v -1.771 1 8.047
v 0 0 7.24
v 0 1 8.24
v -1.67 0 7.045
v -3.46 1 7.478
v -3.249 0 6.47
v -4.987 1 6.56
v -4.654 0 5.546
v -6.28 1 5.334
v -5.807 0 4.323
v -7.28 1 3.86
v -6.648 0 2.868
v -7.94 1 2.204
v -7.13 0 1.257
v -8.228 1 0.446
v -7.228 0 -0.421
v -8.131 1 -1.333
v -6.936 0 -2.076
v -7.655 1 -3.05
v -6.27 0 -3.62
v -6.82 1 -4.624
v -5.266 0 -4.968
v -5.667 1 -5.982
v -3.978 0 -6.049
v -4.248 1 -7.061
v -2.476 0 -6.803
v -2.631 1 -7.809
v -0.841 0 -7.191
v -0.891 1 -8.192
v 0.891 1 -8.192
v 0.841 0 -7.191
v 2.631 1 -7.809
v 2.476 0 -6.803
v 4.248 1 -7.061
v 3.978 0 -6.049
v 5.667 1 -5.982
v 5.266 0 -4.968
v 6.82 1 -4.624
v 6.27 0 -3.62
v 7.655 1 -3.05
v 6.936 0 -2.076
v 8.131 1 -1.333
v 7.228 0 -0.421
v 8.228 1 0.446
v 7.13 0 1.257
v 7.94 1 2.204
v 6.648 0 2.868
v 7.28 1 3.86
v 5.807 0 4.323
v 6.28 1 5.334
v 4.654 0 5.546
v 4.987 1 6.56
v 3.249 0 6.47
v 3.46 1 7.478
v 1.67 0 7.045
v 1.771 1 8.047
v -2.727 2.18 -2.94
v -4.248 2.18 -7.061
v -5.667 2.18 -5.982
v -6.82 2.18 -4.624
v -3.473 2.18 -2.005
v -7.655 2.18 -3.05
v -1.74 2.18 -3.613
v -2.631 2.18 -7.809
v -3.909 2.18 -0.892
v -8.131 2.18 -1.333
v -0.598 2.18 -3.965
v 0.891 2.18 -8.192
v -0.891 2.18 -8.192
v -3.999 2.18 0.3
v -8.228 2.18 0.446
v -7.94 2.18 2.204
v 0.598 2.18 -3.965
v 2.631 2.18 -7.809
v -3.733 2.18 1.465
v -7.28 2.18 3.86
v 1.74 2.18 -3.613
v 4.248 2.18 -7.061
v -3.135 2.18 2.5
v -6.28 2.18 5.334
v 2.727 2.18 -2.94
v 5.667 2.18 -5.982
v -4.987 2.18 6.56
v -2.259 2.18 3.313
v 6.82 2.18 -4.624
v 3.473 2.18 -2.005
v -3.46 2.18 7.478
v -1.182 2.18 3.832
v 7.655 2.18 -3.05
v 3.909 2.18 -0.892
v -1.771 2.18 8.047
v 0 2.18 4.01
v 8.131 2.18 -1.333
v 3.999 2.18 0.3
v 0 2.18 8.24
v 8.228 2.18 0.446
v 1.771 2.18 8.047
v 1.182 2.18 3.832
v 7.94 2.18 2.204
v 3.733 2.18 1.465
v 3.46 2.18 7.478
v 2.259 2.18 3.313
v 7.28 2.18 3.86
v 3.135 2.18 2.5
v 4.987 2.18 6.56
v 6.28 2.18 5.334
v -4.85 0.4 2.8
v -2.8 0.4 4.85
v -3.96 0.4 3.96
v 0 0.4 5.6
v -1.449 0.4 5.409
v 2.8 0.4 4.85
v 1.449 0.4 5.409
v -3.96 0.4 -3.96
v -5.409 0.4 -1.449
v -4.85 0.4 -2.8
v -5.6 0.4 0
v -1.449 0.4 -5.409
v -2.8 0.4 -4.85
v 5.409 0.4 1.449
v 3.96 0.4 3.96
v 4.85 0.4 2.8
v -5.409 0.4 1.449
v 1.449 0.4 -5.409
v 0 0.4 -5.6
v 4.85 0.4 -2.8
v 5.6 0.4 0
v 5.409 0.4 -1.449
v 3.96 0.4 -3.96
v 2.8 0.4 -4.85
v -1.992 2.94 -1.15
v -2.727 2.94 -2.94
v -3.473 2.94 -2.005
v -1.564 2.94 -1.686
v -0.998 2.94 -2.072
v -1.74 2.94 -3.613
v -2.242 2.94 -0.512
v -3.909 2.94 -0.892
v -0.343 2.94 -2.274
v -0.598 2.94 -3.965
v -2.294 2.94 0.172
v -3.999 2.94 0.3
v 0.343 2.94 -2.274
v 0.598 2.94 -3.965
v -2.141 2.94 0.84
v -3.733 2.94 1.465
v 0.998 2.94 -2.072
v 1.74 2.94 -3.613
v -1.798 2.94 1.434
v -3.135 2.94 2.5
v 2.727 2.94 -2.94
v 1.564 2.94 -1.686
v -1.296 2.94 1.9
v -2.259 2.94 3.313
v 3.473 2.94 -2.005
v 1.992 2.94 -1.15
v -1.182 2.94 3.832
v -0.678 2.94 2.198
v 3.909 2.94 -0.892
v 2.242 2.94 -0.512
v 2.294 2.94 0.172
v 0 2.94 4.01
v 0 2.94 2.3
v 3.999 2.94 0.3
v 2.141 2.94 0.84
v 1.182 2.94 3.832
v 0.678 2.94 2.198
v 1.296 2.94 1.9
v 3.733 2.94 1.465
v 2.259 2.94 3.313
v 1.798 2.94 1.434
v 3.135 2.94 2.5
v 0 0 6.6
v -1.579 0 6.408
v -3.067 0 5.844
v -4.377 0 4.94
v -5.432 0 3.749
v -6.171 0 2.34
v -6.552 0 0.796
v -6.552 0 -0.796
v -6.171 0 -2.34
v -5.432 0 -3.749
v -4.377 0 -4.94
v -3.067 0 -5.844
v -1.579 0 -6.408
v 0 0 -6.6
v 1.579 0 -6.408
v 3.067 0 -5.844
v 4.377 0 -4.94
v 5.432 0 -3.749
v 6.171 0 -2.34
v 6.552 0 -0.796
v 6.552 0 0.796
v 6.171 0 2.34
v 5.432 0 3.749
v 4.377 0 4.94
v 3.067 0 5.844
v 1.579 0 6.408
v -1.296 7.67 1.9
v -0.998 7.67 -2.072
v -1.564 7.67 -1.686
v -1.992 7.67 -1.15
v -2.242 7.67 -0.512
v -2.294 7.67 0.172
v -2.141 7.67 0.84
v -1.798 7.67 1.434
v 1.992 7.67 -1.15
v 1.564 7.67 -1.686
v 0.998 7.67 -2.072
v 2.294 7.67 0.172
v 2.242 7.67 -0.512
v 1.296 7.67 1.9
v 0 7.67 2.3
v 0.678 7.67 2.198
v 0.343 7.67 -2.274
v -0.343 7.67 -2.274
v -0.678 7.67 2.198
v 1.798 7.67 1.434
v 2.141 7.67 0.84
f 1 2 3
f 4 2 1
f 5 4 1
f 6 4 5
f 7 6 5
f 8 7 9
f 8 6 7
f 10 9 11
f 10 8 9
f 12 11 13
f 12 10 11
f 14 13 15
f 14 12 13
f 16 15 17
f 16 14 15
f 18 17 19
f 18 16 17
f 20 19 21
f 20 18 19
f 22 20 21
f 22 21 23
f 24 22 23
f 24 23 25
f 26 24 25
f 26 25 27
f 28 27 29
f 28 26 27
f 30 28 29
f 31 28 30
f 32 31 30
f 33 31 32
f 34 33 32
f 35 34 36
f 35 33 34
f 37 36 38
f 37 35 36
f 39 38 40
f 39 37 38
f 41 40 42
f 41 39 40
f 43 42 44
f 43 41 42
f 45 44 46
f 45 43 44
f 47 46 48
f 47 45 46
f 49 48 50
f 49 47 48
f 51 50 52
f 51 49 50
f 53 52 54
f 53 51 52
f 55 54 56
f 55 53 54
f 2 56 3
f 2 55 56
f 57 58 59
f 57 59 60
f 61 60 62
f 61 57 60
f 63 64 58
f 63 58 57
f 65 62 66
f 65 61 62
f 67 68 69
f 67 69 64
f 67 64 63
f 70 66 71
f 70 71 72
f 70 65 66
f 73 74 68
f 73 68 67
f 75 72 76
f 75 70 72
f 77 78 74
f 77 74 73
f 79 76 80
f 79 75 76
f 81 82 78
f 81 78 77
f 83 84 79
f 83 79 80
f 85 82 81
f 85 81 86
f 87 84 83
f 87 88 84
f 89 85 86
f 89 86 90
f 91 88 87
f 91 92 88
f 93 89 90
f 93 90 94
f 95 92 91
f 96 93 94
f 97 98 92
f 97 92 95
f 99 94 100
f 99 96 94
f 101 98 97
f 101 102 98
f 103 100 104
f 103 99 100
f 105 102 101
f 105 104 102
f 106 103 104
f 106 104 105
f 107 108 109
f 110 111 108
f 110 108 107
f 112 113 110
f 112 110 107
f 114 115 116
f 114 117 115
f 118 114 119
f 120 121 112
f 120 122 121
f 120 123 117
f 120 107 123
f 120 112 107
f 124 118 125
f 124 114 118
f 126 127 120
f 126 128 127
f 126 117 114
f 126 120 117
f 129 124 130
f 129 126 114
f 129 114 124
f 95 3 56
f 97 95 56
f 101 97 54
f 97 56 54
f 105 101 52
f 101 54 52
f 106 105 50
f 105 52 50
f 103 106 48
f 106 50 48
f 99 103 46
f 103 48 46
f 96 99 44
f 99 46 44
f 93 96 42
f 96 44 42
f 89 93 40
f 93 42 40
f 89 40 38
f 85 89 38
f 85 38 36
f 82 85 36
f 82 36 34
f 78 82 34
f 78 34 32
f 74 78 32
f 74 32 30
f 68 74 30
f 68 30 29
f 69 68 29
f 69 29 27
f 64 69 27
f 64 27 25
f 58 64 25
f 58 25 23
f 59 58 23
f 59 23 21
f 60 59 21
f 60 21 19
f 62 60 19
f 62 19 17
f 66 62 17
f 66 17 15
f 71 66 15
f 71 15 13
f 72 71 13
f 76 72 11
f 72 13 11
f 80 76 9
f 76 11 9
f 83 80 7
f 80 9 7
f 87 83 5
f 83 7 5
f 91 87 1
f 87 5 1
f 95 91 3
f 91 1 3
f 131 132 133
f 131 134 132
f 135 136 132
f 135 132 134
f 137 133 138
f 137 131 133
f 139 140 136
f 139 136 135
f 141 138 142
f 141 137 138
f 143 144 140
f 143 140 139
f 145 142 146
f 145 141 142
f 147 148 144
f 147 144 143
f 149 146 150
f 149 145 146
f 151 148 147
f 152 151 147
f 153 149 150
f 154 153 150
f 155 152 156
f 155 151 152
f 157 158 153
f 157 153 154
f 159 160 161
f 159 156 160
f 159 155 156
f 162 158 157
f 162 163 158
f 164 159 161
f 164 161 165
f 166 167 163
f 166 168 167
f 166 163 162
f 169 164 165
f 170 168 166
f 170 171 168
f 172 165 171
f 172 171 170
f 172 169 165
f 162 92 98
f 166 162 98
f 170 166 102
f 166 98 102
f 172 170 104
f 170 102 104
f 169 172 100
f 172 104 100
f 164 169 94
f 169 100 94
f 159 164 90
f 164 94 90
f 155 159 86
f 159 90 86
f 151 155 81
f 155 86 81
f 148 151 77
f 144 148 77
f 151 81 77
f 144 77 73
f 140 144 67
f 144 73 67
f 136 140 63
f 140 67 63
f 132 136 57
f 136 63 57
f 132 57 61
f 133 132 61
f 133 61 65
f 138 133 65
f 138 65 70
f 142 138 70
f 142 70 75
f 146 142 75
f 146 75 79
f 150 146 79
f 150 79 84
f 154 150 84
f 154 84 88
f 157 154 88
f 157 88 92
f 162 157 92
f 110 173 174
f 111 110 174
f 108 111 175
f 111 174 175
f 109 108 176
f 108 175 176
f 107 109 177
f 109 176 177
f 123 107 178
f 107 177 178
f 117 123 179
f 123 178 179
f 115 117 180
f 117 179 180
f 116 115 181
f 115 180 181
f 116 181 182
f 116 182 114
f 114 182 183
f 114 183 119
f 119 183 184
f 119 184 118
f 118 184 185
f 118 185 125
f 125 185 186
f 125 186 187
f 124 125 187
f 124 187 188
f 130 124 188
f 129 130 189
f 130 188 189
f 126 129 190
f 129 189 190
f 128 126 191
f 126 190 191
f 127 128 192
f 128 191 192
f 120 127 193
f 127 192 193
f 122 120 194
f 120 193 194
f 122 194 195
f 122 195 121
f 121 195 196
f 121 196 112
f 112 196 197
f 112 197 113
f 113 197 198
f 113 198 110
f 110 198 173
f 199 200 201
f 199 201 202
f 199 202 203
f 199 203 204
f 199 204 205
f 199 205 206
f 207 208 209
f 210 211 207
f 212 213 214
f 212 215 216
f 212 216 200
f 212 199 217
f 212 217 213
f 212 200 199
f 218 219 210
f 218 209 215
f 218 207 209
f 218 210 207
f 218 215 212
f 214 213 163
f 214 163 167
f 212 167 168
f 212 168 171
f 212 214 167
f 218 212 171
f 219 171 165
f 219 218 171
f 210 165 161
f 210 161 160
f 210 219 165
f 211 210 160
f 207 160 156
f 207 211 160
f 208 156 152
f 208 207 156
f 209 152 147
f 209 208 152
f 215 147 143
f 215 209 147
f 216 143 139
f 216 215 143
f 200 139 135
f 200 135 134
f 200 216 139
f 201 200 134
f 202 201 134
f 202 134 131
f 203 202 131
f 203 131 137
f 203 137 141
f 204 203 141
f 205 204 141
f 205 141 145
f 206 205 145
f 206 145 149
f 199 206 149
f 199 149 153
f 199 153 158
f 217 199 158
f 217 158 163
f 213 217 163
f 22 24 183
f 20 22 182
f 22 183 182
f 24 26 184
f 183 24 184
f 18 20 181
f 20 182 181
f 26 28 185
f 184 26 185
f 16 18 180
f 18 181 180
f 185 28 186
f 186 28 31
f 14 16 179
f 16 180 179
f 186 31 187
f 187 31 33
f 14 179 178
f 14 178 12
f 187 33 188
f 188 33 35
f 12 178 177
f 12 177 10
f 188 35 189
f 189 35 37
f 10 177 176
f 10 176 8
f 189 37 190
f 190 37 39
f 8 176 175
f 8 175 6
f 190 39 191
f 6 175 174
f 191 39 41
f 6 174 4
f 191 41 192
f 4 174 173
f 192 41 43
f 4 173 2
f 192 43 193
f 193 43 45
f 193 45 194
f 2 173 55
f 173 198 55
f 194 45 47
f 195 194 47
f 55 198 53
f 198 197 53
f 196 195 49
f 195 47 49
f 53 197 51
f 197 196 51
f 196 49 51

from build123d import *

# Parameters (mm, degrees)
SKETCH_3_R          = 8.24
EXTRUDE_5_DEPTH     = 2.18
SKETCH_7_R          = 4.01
EXTRUDE_6_DEPTH     = 1.36
SKETCH_8_R          = 2.42
EXTRUDE_7_DEPTH     = 4.28
SKETCH_9_R          = 5.6
CUT_EXTRUDE_3_DEPTH = 0.4
CUT_EXTRUDE_START   = -0.6
SKETCH_12_R         = 4.01
SKETCH_12_R_2       = 2.42
CUT_EXTRUDE_5_DEPTH = 0.6
SKETCH_13_OUTSIDE_W = 23.396
SKETCH_13_OUTSIDE_H = 23.396
SKETCH_13_OUTSIDE_R = 2.3
CUT_EXTRUDE_6_DEPTH = 4.88
SKETCH_14_R         = 2.3
CUT_EXTRUDE_7_DEPTH = 0.15


with BuildPart() as part:
    # 草图3 → 凸台-拉伸5 (new body)
    with BuildSketch(Plane(origin=(0, 0, 0), x_dir=(1, 0, 0), z_dir=(0, 1, 0))):
        with Locations(Location((0, 0, 0), (0, 0, 270))):
            Circle(SKETCH_3_R)
    extrude(amount=EXTRUDE_5_DEPTH)

    # 草图7 → 凸台-拉伸6 (add)
    with BuildSketch(Plane(origin=(0, 2.18, 0), x_dir=(1, 0, 0), z_dir=(0, 1, 0))):
        with Locations(Location((0, 0, 0), (0, 0, 270))):
            Circle(SKETCH_7_R)
    extrude(amount=EXTRUDE_6_DEPTH)

    # 草图8 → 凸台-拉伸7 (add)
    with BuildSketch(Plane(origin=(0, 3.54, 0), x_dir=(1, 0, 0), z_dir=(0, 1, 0))):
        with Locations(Location((0, 0, 0), (0, 0, 270))):
            Circle(SKETCH_8_R)
    extrude(amount=EXTRUDE_7_DEPTH)

    # 草图9 → 切除-拉伸3 (cut)
    with BuildSketch(Plane.XZ):
        with Locations(Location((0, 0, 0), (0, 0, 270))):
            Circle(SKETCH_9_R)
    extrude(amount=-CUT_EXTRUDE_3_DEPTH, mode=Mode.SUBTRACT)

    # 草图10 → 切除-旋转1 (revolve, cut)
    with BuildSketch(Plane.XY, mode=Mode.PRIVATE) as cut_revolve_1_sk:
        Polygon((5.6, 0.4), (6.6, 0), (5.6, 0), align=None)
    revolve(cut_revolve_1_sk.sketch.rotate(Axis((0, 7.82, 0), (0, -1, 0)), 90), axis=Axis((0, 7.82, 0), (0, -1, 0)), mode=Mode.SUBTRACT)

    # 草图11 → 切除-旋转2 (revolve, cut)
    with BuildSketch(Plane.XY, mode=Mode.PRIVATE) as cut_revolve_2_sk:
        Polygon((8.24, 0), (8.24, 1), (7.24, 0), align=None)
    revolve(cut_revolve_2_sk.sketch.rotate(Axis((0, 2.18, 0), (0, -1, 0)), 90), axis=Axis((0, 2.18, 0), (0, -1, 0)), mode=Mode.SUBTRACT)

    # 草图12 → 切除-拉伸5 (cut)
    with BuildSketch(Plane(origin=(0, 3.54, 0), x_dir=(1, 0, 0), z_dir=(0, 1, 0)).offset(CUT_EXTRUDE_START)):
        with Locations(Location((0, 0, 0), (0, 0, 270))):
            Circle(SKETCH_12_R)
        with Locations(Location((0, 0, 0), (0, 0, 270))):
            Circle(SKETCH_12_R_2, mode=Mode.SUBTRACT)
    extrude(amount=CUT_EXTRUDE_5_DEPTH, mode=Mode.SUBTRACT)

    # 草图13 outside → 切除-拉伸6 (cut)
    with BuildSketch(Plane(origin=(0, 7.82, 0), x_dir=(1, 0, 0), z_dir=(0, 1, 0))):
        Rectangle(SKETCH_13_OUTSIDE_W, SKETCH_13_OUTSIDE_H)
        with Locations(Location((0, 0, 0), (0, 0, 270))):
            Circle(SKETCH_13_OUTSIDE_R, mode=Mode.SUBTRACT)
    extrude(amount=-CUT_EXTRUDE_6_DEPTH, mode=Mode.SUBTRACT)

    # 草图14 → 切除-拉伸7 (cut)
    with BuildSketch(Plane(origin=(0, 7.82, 0), x_dir=(1, 0, 0), z_dir=(0, 1, 0))):
        with Locations(Location((0, 0, 0), (0, 0, 270))):
            Circle(SKETCH_14_R)
    extrude(amount=-CUT_EXTRUDE_7_DEPTH, mode=Mode.SUBTRACT)


solid = part.part
